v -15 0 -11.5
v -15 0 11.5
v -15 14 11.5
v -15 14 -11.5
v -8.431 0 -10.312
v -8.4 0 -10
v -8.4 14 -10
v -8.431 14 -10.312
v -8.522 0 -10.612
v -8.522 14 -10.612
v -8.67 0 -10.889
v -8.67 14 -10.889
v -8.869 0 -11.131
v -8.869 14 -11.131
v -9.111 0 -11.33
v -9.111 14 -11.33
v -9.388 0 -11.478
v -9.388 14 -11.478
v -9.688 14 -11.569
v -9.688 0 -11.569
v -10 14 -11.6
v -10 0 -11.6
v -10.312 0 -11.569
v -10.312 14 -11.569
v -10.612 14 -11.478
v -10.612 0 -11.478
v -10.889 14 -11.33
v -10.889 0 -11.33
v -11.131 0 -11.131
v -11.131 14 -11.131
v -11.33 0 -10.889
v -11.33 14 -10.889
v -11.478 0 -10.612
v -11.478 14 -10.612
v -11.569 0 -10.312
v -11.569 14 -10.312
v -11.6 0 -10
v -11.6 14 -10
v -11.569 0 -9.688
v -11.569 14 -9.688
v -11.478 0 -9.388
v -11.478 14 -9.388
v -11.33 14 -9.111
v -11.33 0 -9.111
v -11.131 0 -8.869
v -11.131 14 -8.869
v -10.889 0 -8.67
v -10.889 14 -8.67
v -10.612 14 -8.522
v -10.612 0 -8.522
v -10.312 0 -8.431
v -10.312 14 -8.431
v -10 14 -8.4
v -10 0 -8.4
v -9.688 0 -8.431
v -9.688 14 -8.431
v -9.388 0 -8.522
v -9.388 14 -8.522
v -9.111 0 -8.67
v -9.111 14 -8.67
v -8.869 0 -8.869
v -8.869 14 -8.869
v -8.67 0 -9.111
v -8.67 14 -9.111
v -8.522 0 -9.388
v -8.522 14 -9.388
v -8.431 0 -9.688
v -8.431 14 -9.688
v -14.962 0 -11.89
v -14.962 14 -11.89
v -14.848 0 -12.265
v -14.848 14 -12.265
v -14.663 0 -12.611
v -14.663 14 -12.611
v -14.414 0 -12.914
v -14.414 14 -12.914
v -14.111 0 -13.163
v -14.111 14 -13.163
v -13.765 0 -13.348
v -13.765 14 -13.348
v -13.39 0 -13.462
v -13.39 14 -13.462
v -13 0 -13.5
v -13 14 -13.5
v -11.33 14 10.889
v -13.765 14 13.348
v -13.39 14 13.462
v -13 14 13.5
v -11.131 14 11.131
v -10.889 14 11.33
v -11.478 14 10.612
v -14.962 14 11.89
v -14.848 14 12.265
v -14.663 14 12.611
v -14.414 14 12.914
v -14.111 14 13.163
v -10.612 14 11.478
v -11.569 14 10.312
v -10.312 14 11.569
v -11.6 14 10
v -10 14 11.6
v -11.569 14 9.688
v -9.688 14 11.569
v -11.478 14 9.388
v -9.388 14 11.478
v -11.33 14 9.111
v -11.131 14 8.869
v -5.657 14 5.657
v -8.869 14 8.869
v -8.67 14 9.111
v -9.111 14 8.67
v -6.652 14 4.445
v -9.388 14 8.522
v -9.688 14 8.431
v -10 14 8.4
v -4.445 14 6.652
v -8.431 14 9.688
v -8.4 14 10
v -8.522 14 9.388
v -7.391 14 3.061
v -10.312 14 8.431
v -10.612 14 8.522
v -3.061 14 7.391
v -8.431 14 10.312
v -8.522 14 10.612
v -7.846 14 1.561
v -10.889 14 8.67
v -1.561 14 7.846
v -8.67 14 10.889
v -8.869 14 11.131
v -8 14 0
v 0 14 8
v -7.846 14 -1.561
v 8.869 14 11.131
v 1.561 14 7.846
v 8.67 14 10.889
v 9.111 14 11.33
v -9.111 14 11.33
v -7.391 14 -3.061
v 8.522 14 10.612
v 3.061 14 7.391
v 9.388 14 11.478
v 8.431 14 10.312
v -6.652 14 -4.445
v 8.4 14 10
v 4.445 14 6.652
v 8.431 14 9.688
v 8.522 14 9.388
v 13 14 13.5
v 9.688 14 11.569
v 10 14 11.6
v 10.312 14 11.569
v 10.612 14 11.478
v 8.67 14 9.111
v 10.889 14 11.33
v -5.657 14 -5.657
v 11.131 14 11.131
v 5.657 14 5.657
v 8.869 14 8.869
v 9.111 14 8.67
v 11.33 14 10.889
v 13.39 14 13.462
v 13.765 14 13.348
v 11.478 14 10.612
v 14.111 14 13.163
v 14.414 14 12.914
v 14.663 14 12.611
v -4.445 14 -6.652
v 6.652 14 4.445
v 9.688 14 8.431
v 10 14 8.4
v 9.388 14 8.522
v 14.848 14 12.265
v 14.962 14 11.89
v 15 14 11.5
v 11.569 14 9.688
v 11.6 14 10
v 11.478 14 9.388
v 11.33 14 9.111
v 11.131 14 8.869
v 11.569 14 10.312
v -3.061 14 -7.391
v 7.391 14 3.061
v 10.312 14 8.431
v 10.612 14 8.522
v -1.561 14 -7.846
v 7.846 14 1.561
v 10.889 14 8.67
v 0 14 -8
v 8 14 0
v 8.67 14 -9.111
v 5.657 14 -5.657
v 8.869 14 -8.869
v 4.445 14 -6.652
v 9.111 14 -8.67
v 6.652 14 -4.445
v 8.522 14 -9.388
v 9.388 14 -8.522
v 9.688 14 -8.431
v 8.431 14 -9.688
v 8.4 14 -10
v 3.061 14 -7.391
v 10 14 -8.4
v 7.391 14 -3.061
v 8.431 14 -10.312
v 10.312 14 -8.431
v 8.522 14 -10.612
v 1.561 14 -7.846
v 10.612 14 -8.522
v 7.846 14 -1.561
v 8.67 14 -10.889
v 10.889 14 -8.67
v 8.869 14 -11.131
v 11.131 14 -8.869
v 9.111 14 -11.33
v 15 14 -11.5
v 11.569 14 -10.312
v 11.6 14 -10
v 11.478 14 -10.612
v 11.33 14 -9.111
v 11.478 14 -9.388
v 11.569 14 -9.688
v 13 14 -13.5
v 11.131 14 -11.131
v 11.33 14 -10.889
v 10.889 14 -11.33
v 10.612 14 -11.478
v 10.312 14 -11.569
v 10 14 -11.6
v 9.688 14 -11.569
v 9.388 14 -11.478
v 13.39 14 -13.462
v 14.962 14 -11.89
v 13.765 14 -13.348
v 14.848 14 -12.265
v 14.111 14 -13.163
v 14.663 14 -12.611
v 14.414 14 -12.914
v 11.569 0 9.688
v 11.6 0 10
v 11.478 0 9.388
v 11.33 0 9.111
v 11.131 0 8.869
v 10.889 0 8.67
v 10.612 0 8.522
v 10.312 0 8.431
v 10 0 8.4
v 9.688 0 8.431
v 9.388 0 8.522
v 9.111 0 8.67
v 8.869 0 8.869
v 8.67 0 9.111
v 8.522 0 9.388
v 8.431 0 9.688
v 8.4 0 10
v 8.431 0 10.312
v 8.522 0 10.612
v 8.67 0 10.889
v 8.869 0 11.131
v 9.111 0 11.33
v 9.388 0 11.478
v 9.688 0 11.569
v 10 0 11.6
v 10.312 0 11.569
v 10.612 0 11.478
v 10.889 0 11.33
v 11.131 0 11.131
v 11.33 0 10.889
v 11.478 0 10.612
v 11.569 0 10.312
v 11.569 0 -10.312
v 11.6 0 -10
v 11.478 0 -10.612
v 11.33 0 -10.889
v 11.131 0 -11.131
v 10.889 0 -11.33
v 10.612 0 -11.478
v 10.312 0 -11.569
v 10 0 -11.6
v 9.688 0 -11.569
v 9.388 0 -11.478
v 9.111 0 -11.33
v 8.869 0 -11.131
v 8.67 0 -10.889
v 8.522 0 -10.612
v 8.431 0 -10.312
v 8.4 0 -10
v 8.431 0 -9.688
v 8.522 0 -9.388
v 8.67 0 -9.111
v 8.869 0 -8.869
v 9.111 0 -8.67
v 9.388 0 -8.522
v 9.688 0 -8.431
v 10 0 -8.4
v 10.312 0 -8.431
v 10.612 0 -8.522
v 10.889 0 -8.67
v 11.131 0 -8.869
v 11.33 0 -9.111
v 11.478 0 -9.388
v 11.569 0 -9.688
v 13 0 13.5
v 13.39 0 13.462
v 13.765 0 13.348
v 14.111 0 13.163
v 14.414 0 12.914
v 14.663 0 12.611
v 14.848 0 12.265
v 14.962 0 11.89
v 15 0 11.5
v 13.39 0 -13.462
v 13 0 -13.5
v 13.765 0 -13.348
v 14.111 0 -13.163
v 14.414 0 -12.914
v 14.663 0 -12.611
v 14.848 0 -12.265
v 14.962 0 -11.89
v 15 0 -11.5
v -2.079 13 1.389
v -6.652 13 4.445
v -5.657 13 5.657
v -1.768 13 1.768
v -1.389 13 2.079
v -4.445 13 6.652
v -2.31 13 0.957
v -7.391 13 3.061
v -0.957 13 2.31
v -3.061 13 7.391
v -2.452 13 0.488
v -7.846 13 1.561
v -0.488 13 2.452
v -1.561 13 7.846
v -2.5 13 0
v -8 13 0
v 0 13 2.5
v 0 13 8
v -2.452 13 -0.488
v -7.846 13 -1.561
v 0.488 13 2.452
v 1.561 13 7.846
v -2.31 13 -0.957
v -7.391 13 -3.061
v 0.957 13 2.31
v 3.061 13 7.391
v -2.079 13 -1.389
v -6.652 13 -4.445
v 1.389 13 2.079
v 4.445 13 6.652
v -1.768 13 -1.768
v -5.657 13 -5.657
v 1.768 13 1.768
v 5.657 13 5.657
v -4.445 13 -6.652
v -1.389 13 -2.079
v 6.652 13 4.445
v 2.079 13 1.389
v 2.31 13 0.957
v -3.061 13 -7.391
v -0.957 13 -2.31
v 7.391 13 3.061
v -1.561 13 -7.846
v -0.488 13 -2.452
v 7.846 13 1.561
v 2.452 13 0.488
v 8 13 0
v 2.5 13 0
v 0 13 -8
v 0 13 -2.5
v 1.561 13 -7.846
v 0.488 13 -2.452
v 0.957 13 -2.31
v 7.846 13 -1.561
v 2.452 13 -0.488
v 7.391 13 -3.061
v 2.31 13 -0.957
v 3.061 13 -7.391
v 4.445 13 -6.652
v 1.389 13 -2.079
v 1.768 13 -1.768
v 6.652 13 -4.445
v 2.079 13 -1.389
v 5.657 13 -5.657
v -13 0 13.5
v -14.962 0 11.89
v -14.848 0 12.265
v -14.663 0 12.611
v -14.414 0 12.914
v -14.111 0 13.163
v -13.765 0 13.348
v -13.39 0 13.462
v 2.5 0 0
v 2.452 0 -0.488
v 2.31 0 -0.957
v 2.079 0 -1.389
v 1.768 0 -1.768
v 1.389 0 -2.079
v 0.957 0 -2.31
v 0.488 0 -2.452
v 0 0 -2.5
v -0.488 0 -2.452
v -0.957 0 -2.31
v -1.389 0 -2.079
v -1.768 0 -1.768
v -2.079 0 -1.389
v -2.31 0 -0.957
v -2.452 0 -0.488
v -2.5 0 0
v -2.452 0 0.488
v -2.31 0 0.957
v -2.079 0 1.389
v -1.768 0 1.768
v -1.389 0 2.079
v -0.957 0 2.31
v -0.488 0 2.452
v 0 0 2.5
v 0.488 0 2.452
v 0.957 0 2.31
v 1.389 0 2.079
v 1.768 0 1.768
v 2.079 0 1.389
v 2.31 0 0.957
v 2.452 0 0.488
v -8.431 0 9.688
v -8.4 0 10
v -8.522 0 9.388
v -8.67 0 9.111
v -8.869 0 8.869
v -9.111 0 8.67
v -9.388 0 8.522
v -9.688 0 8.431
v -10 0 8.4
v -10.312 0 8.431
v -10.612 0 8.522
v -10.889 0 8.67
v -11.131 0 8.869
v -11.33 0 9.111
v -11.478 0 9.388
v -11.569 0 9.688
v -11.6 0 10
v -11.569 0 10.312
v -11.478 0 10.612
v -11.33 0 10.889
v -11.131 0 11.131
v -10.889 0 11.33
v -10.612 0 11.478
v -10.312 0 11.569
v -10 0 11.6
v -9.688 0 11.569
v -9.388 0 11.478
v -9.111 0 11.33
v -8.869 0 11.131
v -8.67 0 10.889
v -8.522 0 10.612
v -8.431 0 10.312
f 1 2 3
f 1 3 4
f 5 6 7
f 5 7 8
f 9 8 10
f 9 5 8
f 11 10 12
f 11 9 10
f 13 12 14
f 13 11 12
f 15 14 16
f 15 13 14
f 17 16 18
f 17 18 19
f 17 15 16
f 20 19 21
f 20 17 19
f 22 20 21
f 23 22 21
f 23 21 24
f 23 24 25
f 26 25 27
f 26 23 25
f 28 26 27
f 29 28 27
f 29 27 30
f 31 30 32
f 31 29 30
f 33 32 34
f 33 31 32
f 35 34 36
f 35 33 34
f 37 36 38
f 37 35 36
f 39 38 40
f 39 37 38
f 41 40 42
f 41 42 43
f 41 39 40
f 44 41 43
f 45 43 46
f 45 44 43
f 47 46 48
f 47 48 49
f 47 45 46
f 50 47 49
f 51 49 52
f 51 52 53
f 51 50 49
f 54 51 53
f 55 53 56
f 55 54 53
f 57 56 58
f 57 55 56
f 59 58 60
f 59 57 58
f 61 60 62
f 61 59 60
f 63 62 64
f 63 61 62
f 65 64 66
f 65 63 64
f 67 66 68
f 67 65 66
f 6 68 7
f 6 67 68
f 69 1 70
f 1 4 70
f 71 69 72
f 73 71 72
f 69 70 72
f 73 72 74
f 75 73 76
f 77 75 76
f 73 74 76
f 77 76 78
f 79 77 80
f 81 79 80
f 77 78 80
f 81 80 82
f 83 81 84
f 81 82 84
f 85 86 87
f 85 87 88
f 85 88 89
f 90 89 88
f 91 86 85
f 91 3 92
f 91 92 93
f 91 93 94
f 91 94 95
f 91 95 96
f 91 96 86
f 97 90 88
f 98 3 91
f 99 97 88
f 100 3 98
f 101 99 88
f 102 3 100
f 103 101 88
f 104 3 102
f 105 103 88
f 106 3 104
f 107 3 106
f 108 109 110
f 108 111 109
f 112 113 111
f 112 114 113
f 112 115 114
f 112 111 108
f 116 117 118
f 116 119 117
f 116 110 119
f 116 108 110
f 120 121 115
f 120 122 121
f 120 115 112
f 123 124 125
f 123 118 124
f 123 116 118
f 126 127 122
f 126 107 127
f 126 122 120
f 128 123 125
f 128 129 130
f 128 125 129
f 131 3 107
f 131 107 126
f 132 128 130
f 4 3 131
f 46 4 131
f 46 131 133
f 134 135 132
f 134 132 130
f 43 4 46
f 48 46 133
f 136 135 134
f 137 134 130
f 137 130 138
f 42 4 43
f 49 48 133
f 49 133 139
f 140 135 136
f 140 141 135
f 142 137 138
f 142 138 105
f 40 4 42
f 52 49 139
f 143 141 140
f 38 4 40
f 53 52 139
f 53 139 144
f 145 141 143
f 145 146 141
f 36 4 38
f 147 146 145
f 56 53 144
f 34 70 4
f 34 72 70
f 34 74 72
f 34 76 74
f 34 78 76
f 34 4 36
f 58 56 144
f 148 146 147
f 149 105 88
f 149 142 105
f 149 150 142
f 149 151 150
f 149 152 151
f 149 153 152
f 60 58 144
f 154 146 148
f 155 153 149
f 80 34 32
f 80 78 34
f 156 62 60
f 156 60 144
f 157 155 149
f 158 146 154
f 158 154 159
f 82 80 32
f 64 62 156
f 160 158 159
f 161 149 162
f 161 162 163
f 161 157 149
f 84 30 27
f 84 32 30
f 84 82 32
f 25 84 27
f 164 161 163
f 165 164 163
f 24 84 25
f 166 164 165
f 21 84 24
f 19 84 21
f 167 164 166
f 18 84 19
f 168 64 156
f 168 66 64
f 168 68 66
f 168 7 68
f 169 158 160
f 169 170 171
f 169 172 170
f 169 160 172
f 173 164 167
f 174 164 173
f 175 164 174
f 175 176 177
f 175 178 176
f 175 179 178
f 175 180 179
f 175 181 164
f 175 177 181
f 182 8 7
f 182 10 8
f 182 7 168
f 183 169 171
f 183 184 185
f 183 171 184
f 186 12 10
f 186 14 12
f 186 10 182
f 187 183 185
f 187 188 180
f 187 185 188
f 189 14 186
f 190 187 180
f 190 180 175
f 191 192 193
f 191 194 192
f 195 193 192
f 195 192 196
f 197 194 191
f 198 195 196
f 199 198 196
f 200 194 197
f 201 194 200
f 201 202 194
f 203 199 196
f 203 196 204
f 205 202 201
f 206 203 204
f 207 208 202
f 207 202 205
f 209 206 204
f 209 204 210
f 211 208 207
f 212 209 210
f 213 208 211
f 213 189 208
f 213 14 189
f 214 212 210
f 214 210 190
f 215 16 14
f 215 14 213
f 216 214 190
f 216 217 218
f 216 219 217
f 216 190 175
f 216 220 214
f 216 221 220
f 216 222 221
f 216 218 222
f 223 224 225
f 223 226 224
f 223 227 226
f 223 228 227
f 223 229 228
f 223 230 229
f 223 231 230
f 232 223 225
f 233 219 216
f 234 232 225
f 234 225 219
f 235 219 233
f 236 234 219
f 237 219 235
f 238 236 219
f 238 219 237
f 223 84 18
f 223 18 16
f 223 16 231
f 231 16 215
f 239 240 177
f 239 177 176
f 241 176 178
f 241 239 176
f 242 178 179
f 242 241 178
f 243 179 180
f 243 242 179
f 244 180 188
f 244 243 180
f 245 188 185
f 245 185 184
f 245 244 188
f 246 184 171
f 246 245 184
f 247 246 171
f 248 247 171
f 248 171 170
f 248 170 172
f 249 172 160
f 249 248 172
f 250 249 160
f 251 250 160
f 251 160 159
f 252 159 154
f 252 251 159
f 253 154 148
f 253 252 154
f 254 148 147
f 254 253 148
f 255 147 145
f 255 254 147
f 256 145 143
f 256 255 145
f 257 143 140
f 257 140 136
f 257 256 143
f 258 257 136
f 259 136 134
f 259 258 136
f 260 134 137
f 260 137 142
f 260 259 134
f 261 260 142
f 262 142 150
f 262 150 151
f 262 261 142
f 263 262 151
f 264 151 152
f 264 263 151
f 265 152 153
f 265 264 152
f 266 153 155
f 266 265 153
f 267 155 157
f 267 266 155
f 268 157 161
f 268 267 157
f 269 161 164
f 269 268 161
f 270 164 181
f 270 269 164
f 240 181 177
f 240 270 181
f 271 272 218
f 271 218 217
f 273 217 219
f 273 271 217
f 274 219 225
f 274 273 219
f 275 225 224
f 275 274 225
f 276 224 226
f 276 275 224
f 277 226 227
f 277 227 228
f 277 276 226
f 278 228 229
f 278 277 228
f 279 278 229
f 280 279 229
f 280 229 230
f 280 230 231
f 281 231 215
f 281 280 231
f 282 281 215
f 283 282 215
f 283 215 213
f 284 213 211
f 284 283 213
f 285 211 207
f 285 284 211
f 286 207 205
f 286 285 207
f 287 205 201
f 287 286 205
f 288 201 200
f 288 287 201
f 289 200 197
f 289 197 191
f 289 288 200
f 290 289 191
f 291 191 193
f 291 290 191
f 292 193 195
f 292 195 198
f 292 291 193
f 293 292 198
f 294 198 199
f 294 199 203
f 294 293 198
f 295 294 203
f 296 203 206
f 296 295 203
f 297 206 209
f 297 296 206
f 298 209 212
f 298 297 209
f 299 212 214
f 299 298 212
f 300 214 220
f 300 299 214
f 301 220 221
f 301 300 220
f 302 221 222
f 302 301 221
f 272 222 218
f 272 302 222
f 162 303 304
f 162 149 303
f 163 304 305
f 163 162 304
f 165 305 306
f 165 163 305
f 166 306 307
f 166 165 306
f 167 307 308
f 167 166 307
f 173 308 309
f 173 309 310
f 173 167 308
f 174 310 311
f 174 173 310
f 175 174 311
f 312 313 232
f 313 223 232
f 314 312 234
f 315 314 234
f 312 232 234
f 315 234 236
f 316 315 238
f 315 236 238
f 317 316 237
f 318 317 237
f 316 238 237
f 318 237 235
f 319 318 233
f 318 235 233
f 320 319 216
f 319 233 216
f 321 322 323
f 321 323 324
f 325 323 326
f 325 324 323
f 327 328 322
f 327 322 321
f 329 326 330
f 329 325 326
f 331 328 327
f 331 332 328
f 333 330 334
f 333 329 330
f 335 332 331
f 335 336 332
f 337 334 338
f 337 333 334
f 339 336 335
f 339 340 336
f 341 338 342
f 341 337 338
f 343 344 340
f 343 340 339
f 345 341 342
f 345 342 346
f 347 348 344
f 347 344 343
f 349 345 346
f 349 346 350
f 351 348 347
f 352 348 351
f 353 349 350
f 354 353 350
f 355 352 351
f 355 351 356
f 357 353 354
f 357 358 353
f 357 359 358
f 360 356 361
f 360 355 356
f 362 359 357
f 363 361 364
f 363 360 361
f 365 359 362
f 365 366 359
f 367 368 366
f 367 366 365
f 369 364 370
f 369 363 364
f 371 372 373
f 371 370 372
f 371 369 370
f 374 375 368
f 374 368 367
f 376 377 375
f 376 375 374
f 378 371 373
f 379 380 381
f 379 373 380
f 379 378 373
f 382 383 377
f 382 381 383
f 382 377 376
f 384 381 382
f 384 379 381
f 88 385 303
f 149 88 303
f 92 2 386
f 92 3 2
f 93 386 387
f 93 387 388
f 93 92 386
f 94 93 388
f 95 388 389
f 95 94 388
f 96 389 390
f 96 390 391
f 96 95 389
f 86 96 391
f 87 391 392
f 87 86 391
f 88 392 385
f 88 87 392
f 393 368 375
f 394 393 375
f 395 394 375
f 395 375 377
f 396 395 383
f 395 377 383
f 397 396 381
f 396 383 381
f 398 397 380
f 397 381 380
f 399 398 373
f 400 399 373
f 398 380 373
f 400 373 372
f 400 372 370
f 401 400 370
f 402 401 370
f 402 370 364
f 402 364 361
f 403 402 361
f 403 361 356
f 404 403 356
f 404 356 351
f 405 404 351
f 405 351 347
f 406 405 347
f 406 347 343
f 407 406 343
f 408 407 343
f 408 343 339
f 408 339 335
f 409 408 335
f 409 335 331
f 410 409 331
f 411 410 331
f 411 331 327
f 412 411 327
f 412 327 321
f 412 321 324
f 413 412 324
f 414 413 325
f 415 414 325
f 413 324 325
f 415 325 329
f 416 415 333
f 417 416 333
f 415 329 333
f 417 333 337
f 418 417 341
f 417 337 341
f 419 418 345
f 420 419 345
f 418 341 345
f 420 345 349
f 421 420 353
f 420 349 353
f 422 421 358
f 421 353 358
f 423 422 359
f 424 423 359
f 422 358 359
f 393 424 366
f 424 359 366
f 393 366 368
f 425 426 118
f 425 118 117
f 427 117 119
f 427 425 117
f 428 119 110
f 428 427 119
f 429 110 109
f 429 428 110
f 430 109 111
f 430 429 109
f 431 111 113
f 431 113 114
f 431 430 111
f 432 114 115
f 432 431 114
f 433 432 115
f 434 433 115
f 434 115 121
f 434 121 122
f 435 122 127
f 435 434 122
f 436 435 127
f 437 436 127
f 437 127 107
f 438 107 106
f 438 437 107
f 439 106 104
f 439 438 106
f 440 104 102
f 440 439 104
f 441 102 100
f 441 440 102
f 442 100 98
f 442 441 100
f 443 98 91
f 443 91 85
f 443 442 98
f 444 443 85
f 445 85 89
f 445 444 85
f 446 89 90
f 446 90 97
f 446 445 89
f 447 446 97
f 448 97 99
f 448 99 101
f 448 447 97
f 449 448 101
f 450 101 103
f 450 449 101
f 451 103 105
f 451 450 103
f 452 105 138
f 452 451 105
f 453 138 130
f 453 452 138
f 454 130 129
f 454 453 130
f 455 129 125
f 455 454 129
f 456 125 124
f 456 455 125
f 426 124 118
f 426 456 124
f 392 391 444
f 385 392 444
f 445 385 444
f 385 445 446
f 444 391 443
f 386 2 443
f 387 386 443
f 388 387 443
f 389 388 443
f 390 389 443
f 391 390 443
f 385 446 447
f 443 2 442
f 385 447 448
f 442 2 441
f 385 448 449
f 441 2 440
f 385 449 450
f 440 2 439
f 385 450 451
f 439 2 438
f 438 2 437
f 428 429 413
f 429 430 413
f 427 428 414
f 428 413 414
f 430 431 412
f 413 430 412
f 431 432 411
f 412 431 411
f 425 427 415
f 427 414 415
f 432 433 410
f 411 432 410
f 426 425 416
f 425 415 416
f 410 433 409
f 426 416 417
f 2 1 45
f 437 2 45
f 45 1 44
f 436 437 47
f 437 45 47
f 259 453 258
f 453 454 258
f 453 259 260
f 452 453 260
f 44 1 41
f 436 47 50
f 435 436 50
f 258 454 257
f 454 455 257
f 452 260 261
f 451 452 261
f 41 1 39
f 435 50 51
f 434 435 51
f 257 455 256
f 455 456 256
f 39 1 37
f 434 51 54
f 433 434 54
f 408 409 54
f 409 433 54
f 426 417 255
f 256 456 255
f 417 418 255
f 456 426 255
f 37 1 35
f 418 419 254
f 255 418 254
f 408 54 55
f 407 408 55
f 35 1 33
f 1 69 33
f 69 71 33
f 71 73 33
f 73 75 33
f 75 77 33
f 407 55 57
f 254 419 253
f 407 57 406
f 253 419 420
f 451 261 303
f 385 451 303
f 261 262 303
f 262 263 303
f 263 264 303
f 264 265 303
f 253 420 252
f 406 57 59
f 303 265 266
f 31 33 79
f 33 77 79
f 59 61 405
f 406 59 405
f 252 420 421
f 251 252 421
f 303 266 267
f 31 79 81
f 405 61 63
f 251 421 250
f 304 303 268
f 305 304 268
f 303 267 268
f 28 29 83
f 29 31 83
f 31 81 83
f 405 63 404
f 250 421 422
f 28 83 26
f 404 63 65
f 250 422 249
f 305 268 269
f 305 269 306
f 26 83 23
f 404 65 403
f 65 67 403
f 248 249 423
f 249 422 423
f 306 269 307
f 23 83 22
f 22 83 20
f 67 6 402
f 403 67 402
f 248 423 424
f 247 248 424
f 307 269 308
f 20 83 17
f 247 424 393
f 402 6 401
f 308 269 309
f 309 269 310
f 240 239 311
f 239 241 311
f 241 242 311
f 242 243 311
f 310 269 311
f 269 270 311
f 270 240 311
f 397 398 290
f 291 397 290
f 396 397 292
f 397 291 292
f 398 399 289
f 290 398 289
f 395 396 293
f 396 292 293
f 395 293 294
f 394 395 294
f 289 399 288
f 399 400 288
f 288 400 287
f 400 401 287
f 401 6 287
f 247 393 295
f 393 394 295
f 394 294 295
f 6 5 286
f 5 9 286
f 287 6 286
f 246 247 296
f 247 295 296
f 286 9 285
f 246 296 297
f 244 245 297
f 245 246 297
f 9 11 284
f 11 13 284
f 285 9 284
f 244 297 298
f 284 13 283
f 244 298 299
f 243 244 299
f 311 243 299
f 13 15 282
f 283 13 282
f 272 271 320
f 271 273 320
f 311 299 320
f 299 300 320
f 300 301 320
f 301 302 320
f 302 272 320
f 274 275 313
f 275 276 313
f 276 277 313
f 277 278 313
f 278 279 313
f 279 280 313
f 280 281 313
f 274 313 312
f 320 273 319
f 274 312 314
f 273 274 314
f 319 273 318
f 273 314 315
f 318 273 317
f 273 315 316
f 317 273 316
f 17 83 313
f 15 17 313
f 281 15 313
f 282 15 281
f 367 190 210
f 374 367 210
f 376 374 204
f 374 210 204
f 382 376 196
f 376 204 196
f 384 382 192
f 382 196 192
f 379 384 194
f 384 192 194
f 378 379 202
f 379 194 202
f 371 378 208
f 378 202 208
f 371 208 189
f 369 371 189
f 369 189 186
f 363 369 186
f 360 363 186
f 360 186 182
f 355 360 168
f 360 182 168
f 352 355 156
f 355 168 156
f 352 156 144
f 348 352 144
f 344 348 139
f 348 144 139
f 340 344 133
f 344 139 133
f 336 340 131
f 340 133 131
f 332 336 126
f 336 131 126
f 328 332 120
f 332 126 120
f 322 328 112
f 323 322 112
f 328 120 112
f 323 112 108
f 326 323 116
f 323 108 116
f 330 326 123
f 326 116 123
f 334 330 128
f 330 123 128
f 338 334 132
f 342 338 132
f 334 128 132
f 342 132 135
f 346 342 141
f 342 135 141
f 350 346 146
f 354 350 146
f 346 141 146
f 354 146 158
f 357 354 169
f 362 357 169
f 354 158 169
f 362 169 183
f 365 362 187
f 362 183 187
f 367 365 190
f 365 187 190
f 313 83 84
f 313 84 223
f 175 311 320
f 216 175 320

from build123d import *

# Parameters (mm, degrees)
SKETCH_1_W          = 30
SKETCH_1_H          = 27
SKETCH_1_R          = 1.6
EXTRUDE_1_DEPTH     = 14
SKETCH_2_R          = 2.5
CUT_EXTRUDE_1_DEPTH = 15
SKETCH_3_R          = 8
CUT_EXTRUDE_2_DEPTH = 1
FILLET_1_R          = 2


with BuildPart() as part:
    # 草图1 → 凸台-拉伸1 (new body)
    with BuildSketch(Plane(origin=(0, 0, 0), x_dir=(1, 0, 0), z_dir=(0, 1, 0))):
        Rectangle(SKETCH_1_W, SKETCH_1_H)
        with Locations((-10, 10)):
            Circle(SKETCH_1_R, mode=Mode.SUBTRACT)
        with Locations((10, 10)):
            Circle(SKETCH_1_R, mode=Mode.SUBTRACT)
        with Locations((10, -10)):
            Circle(SKETCH_1_R, mode=Mode.SUBTRACT)
        with Locations((-10, -10)):
            Circle(SKETCH_1_R, mode=Mode.SUBTRACT)
    extrude(amount=EXTRUDE_1_DEPTH)

    # 草图2 → 切除-拉伸1 (cut, through all)
    with BuildSketch(Plane(origin=(0, 14, 0), x_dir=(1, 0, 0), z_dir=(0, 1, 0))):
        Circle(SKETCH_2_R)
    extrude(amount=-CUT_EXTRUDE_1_DEPTH, mode=Mode.SUBTRACT)

    # 草图3 → 切除-拉伸2 (cut)
    with BuildSketch(Plane(origin=(0, 14, 0), x_dir=(1, 0, 0), z_dir=(0, 1, 0))):
        Circle(SKETCH_3_R)
    extrude(amount=-CUT_EXTRUDE_2_DEPTH, mode=Mode.SUBTRACT)

    # 圆角1
    fillet_1_edges = [part.edges().sort_by_distance(p)[0] for p in [
        (15, 7, 13.5),
        (-15, 7, 13.5),
        (-15, 7, -13.5),
        (15, 7, -13.5),
    ]]
    fillet(fillet_1_edges, radius=FILLET_1_R)


solid = part.part
